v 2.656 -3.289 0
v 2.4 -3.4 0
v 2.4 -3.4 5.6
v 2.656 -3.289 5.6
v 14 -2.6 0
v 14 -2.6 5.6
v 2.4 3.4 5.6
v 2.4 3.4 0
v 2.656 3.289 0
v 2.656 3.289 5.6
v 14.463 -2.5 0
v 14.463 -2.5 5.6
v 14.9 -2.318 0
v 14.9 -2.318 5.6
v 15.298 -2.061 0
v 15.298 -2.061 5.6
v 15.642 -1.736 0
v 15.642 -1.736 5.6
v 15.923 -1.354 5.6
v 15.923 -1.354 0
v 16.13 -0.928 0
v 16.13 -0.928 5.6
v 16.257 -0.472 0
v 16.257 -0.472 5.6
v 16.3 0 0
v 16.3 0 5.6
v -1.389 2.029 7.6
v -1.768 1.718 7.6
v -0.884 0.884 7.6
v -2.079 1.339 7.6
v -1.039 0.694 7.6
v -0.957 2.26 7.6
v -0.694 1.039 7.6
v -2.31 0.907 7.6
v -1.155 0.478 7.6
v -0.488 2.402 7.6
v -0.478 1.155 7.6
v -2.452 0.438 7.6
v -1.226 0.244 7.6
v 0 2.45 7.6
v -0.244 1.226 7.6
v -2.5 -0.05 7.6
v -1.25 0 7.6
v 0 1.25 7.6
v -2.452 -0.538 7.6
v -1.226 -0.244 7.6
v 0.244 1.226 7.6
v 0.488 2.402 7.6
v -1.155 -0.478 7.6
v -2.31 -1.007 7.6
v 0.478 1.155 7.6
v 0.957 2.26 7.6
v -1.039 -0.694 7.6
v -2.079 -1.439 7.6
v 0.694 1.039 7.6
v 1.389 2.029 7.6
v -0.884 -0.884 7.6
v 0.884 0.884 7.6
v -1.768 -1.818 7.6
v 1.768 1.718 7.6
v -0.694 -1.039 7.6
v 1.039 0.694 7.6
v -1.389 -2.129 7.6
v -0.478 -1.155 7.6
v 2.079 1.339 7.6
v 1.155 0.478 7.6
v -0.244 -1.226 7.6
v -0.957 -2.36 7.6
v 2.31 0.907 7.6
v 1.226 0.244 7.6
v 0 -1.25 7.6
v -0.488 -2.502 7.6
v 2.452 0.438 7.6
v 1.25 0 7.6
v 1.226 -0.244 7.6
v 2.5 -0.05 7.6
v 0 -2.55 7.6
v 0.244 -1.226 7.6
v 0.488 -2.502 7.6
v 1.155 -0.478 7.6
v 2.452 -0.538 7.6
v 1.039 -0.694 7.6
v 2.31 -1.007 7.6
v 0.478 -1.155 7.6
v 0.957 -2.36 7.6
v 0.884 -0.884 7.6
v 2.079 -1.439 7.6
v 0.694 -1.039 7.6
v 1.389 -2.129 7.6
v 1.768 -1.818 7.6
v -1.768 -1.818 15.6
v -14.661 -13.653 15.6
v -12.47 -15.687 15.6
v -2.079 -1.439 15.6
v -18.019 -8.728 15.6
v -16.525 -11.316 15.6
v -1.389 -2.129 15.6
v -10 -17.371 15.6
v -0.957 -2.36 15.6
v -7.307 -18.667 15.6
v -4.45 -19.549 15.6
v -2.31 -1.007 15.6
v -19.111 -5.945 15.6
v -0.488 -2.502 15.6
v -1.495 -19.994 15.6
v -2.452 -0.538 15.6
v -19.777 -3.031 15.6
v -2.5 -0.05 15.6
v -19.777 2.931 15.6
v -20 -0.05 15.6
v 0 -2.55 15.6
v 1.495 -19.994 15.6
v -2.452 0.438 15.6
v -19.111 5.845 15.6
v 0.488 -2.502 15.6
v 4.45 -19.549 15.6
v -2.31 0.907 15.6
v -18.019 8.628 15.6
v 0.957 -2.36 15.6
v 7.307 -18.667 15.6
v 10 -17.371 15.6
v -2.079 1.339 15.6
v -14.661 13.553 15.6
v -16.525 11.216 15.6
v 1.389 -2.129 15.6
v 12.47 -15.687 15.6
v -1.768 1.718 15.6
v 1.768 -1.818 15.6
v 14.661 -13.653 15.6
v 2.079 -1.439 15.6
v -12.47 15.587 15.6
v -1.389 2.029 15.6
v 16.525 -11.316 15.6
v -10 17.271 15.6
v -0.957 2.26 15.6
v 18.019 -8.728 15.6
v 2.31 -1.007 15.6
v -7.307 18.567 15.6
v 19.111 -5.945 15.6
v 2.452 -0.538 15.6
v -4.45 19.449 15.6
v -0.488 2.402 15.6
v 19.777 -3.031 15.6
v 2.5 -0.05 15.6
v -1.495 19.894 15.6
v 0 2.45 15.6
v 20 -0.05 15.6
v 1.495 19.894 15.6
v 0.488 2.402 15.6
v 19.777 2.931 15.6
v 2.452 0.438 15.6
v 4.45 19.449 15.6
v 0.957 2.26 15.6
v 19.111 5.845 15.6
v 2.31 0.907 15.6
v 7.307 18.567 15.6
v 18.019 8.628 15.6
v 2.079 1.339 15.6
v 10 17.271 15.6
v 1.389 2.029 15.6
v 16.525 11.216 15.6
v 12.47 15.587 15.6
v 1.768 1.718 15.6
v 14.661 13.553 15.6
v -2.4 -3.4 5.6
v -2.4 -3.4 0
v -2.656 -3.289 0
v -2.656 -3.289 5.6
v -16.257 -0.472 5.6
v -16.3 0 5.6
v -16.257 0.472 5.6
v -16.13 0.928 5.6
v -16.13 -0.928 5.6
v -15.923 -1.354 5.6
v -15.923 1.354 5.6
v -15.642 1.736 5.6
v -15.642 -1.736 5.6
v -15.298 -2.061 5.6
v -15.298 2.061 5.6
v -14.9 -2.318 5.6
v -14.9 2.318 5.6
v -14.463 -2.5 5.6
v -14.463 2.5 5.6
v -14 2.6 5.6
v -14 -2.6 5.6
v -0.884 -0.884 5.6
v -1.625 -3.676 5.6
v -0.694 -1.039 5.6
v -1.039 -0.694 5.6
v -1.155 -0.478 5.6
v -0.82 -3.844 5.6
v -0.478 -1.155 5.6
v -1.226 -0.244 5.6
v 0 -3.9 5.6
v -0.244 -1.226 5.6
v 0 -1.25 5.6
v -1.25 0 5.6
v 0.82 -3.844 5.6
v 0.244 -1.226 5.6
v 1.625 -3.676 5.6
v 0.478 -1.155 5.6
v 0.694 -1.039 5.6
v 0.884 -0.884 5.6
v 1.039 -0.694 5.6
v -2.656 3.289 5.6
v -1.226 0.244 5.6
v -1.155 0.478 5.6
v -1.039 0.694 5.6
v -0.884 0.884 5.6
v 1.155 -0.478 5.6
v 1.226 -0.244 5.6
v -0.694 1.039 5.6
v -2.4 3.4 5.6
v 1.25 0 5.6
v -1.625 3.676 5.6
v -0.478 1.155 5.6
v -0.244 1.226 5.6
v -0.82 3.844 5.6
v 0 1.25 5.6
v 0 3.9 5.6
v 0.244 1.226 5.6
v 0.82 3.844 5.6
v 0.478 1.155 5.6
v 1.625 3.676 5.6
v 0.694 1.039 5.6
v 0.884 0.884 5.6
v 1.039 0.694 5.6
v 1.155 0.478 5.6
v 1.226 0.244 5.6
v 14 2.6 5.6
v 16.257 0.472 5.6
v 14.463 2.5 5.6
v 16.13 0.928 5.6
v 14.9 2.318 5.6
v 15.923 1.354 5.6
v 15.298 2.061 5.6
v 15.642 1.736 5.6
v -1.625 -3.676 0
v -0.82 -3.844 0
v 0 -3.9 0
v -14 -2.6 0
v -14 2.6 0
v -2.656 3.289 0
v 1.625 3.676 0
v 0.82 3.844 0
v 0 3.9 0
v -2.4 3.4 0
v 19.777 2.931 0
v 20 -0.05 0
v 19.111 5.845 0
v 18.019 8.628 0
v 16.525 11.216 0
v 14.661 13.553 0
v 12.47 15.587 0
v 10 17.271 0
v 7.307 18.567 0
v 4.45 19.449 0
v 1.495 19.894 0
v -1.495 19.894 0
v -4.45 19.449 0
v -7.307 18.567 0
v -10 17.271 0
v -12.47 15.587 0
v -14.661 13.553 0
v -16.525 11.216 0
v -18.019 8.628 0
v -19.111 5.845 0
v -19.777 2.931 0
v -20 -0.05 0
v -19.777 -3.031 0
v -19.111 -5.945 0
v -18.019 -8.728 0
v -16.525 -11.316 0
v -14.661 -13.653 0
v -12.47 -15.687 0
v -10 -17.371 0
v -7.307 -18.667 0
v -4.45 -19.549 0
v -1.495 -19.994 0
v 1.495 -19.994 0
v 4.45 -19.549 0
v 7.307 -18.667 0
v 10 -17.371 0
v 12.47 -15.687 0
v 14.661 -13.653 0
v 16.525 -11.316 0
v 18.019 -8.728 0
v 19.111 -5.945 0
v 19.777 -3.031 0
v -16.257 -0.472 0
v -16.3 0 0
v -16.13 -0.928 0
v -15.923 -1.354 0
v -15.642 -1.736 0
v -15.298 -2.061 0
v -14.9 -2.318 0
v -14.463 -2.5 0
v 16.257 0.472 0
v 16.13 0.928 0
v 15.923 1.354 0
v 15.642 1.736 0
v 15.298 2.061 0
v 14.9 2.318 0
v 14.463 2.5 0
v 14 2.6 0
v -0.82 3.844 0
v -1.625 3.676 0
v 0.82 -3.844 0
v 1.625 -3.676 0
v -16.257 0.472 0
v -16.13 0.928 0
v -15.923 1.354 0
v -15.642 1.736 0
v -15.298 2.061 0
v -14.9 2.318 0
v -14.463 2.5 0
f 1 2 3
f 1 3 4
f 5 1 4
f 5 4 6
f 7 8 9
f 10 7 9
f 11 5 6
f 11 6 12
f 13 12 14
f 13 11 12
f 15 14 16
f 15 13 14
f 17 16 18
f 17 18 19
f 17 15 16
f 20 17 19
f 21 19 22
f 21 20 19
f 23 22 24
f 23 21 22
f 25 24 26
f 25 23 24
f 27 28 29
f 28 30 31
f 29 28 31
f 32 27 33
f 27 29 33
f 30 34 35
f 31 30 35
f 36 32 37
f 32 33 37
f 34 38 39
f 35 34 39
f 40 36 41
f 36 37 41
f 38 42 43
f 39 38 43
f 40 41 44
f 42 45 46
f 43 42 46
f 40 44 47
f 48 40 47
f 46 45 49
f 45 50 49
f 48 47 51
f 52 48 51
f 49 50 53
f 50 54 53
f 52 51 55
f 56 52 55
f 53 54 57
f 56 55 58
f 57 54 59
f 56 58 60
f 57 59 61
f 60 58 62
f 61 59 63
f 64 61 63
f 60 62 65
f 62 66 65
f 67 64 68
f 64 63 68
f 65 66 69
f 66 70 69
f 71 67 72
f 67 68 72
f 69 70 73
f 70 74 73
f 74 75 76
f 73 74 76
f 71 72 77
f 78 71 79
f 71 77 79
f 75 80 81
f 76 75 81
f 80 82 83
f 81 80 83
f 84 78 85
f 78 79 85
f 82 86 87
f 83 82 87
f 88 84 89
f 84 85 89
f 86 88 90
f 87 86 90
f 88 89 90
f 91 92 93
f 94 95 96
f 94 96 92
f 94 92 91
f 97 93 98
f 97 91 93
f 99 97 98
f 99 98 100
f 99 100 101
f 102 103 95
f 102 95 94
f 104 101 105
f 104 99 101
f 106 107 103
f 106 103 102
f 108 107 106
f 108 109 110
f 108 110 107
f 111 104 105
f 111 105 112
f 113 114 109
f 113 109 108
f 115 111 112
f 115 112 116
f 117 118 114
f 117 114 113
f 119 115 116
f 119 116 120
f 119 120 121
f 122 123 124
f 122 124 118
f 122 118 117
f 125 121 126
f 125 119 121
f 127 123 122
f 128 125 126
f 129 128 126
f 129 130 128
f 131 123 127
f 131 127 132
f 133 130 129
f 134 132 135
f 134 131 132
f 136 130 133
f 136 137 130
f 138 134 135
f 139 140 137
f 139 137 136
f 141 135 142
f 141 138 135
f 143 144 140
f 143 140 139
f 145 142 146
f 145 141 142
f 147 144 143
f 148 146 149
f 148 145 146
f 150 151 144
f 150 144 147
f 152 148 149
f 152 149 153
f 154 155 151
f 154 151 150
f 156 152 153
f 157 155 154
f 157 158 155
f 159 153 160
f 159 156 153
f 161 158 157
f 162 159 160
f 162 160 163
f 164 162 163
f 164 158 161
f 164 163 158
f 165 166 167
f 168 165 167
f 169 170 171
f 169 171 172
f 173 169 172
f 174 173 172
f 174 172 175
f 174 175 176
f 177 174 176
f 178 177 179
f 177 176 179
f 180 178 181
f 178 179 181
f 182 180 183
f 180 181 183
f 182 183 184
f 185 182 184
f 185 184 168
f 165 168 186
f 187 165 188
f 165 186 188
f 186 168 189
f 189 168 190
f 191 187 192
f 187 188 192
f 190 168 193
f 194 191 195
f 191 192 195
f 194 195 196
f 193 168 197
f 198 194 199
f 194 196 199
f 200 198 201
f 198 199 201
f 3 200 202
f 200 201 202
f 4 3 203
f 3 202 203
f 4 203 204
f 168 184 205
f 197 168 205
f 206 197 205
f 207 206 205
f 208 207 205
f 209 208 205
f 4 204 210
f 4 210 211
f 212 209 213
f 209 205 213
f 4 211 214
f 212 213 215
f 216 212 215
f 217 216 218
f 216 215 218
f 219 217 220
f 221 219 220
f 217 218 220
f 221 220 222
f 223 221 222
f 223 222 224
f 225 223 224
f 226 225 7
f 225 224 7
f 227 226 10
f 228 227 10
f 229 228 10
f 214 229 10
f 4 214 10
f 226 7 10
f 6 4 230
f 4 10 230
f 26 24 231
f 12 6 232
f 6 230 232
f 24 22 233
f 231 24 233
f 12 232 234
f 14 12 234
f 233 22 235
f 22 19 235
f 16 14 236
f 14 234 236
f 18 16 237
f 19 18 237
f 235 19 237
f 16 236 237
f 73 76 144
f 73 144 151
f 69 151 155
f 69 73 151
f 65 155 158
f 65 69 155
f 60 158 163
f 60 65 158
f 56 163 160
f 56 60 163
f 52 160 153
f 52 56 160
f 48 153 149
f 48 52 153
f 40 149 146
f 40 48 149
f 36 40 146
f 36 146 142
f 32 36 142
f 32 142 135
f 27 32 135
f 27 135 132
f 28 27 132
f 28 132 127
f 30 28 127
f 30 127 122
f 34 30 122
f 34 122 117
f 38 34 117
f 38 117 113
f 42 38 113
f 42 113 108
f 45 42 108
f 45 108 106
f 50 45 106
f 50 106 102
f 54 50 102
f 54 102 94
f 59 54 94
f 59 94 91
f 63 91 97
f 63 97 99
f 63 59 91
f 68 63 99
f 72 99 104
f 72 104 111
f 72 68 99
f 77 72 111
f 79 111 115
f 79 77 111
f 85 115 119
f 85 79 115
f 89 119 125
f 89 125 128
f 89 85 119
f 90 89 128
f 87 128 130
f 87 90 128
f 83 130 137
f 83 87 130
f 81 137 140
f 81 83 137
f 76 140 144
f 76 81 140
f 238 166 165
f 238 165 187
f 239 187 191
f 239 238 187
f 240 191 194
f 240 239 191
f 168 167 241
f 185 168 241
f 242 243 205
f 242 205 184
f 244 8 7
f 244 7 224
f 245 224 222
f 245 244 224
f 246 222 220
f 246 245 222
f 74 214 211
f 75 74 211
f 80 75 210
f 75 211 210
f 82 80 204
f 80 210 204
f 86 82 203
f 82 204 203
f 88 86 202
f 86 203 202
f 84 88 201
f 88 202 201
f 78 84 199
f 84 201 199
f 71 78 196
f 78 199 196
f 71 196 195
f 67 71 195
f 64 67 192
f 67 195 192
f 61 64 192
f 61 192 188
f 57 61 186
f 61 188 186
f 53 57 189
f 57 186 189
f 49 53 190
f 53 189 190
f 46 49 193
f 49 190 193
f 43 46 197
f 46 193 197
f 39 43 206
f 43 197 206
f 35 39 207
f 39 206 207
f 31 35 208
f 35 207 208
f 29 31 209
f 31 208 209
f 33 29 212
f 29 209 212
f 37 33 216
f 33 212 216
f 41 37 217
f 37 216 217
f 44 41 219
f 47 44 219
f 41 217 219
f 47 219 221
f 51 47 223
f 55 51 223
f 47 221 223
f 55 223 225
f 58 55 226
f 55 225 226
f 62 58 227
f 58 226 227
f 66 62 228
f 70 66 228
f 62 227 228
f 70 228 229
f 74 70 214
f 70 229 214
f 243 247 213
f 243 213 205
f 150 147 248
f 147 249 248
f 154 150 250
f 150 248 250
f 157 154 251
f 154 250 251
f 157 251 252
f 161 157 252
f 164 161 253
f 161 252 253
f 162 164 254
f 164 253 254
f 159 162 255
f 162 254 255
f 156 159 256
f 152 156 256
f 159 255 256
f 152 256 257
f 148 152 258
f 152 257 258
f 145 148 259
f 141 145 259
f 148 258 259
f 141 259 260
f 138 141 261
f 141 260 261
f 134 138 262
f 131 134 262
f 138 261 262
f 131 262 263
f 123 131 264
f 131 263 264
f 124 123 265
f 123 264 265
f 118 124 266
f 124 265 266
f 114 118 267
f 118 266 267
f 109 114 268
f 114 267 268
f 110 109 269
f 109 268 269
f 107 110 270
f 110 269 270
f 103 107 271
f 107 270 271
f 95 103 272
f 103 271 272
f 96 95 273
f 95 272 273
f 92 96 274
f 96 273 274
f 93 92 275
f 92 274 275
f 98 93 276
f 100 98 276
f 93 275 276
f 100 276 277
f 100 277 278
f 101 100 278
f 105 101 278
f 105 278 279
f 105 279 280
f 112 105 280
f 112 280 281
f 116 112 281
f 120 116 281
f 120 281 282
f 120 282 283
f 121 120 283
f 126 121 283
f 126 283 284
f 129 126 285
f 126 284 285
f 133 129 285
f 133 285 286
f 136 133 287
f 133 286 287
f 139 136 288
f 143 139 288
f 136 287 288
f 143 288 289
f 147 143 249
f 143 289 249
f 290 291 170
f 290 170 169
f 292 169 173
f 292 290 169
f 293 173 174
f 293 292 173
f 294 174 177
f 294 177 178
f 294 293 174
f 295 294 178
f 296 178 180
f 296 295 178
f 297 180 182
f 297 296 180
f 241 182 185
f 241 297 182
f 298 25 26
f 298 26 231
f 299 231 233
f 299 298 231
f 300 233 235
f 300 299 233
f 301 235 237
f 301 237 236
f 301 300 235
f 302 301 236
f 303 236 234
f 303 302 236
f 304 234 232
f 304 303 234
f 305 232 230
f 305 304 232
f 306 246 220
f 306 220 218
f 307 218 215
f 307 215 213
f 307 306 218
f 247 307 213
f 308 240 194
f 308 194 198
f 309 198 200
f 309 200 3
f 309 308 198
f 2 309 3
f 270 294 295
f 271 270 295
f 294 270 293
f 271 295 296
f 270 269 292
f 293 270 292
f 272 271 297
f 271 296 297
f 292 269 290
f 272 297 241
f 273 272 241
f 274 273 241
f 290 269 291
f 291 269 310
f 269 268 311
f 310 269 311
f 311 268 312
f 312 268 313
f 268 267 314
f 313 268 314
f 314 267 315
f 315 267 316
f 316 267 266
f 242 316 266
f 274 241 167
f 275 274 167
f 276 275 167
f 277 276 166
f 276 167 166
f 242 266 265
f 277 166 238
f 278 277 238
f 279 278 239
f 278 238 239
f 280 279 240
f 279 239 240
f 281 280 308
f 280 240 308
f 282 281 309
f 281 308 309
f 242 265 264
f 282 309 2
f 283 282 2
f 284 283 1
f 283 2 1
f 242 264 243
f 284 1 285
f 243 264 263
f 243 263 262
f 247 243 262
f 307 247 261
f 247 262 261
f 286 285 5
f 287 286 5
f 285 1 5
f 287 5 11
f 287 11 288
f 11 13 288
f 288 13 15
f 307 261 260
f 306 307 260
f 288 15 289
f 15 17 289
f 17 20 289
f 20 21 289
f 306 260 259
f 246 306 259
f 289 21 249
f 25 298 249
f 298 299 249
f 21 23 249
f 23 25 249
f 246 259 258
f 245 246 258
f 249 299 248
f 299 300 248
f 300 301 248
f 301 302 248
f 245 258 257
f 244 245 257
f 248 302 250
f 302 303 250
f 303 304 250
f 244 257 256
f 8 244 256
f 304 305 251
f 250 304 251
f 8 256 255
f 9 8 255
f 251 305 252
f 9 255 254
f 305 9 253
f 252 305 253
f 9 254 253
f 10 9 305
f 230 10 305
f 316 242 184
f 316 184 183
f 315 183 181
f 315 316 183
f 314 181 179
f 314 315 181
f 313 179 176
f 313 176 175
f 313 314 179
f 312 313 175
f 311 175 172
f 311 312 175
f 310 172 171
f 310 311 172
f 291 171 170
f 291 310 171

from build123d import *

# Parameters (mm, degrees)
SKETCH026_R   = 20
PAD004_DEPTH  = 5.6
SKETCH027_R   = 20
SKETCH027_R_2 = 2.5
PAD005_DEPTH  = 10
SKETCH028_R   = 3.07
SKETCH028_R_2 = 1.25
PAD006_DEPTH  = 2


with BuildPart() as part:
    # Sketch026 → Pad004 (new body)
    with BuildSketch(Plane.XY):
        with Locations((0, -0.05)):
            Circle(SKETCH026_R)
        with BuildLine():
            ThreePointArc((0, 3.9), (-1.225765, 3.773672), (-2.4, 3.4))
            Line((-2.4, 3.4), (-2.655951, 3.288515))
            Line((-2.655951, 3.288515), (-14, 2.6))
            ThreePointArc((-14, 2.6), (-15.64248, 1.735655), (-16.3, 0))
            ThreePointArc((-16.3, 0), (-15.64248, -1.735655), (-14, -2.6))
            Line((-2.655951, -3.288515), (-14, -2.6))
            Line((-2.4, -3.4), (-2.655951, -3.288515))
            ThreePointArc((-2.4, -3.4), (-1.225765, -3.773672), (0, -3.9))
            ThreePointArc((0, -3.9), (1.225765, -3.773672), (2.4, -3.4))
            Line((2.4, -3.4), (2.655951, -3.288515))
            Line((2.655951, -3.288515), (14, -2.6))
            ThreePointArc((14, -2.6), (15.64248, -1.735655), (16.3, 0))
            ThreePointArc((16.3, 0), (15.64248, 1.735655), (14, 2.6))
            Line((2.655951, 3.288515), (14, 2.6))
            Line((2.4, 3.4), (2.655951, 3.288515))
            ThreePointArc((2.4, 3.4), (1.225765, 3.773672), (0, 3.9))
        make_face(mode=Mode.SUBTRACT)
    extrude(amount=PAD004_DEPTH)

    # Sketch027 (on Face11 of Pad004) → Pad005 (join)
    with BuildSketch(Plane.XY.offset(5.6)):
        with Locations((0, -0.05)):
            Circle(SKETCH027_R)
        with Locations((0, -0.05)):
            Circle(SKETCH027_R_2, mode=Mode.SUBTRACT)
    extrude(amount=PAD005_DEPTH)

    # Sketch028 (on Face14 of Pad005) → Pad006 (join)
    with BuildSketch(Plane(origin=(0, 0, 5.6), x_dir=(1, 0, 0), z_dir=(0, 0, -1))):
        Circle(SKETCH028_R)
        Circle(SKETCH028_R_2, mode=Mode.SUBTRACT)
    extrude(amount=-PAD006_DEPTH)


solid = part.part
